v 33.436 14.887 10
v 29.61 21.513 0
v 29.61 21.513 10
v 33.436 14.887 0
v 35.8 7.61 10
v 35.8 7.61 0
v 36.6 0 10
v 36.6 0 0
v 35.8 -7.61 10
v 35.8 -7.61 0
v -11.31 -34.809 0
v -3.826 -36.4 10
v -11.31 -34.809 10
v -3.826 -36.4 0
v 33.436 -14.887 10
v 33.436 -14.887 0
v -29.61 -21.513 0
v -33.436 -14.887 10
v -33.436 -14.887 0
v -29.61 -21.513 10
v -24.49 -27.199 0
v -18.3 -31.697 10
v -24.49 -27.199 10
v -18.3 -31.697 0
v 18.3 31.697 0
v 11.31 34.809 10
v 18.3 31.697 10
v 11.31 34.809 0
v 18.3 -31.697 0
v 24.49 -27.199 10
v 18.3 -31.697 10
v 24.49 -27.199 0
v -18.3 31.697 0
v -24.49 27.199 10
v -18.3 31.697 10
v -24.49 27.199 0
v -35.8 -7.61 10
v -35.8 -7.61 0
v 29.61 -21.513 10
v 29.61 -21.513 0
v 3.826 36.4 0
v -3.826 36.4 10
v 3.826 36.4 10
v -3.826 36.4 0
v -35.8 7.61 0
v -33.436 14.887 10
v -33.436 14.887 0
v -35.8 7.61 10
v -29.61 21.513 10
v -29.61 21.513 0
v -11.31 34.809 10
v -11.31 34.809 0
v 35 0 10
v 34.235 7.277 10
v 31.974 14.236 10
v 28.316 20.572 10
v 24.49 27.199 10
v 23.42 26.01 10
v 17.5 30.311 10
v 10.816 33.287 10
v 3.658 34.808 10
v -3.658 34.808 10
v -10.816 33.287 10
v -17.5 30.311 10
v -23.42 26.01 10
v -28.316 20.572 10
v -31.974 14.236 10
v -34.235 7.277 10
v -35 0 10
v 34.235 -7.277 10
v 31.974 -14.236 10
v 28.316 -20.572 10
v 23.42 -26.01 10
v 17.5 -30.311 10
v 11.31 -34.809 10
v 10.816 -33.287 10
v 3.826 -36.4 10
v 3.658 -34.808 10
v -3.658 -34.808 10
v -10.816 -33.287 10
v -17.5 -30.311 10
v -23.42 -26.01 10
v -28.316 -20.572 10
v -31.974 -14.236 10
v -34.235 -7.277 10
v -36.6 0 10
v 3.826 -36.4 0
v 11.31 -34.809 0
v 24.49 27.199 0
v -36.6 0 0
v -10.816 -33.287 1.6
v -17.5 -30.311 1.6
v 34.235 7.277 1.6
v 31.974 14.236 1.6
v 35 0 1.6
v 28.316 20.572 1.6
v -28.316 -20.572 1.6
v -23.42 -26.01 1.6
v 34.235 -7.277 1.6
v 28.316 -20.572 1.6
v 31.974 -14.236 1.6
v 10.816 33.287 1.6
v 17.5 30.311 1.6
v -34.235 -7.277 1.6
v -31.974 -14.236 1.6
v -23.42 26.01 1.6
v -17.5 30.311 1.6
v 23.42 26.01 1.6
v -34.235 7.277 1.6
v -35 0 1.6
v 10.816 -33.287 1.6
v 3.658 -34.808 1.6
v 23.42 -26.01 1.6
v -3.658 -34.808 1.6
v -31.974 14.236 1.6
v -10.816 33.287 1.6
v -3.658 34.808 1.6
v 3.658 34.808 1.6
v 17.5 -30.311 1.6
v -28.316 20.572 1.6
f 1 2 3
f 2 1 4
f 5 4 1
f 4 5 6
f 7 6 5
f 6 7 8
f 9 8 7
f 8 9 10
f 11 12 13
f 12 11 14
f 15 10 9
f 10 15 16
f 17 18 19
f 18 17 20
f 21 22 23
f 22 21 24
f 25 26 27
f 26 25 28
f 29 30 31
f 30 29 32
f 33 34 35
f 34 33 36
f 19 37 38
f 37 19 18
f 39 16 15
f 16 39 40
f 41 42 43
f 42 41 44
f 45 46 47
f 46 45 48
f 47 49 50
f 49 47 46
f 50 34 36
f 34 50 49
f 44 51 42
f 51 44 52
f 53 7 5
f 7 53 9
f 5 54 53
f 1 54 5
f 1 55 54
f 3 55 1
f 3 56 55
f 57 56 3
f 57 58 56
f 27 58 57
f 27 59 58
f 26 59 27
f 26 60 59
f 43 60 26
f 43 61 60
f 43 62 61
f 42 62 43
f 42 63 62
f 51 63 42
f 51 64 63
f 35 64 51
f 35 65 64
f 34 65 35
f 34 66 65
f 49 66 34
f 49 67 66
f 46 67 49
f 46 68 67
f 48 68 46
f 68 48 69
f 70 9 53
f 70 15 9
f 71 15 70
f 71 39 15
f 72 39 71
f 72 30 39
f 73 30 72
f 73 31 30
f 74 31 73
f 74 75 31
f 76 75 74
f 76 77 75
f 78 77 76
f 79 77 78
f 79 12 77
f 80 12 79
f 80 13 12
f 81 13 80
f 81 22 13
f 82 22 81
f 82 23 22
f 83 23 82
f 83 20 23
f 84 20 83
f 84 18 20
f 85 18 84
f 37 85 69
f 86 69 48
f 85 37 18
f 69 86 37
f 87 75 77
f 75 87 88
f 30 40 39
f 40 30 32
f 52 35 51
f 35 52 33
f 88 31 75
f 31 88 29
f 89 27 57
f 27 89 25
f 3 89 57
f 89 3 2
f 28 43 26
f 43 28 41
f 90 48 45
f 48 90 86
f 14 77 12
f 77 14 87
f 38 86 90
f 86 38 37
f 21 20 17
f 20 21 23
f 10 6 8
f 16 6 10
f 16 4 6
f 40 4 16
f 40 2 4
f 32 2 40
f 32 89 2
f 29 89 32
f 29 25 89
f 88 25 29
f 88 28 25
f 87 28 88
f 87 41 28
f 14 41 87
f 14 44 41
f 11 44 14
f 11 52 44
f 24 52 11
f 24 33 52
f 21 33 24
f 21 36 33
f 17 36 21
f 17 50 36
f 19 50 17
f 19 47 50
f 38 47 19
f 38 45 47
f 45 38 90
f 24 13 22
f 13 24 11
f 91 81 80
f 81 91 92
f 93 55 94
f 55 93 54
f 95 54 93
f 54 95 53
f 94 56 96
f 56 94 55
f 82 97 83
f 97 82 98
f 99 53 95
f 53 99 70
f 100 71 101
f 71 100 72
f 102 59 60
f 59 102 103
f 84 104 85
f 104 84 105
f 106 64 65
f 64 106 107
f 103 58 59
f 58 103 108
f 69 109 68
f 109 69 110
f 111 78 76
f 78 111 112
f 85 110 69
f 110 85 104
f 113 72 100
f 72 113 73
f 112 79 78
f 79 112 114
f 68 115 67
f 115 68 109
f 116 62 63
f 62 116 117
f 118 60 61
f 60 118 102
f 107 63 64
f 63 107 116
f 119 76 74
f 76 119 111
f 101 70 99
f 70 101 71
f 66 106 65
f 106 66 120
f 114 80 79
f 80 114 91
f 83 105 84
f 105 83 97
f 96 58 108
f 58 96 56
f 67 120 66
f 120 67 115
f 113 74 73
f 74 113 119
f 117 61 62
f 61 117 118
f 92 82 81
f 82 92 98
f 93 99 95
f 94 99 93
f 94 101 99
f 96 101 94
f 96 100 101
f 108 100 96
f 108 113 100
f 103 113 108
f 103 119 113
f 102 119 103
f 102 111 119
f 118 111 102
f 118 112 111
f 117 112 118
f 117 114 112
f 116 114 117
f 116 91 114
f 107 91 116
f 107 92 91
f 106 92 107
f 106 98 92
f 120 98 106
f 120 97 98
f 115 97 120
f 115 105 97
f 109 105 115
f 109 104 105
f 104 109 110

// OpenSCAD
// file: modules.scad
module petri_dish(h, inner_r, thickness) {
    difference() {
        cylinder(h = h, r = inner_r + thickness);
        translate([0, 0, thickness]) {
            cylinder(h = h, r = inner_r);
        }
    }
}
// file: constants.scad
// 3Dプリンタ特性
thickness = 1.6;
margin = 0.6;
thin = 0.001; // boolean演算の境界面を重ねないための微小値

// 対象特性
tray_inner_radius = 35;
tray_height = 10;
drainer_height = 4;
drainer_hole_size = 10;
// main file
include <constants.scad>;
include <modules.scad>;

petri_dish(tray_height, tray_inner_radius, thickness);
